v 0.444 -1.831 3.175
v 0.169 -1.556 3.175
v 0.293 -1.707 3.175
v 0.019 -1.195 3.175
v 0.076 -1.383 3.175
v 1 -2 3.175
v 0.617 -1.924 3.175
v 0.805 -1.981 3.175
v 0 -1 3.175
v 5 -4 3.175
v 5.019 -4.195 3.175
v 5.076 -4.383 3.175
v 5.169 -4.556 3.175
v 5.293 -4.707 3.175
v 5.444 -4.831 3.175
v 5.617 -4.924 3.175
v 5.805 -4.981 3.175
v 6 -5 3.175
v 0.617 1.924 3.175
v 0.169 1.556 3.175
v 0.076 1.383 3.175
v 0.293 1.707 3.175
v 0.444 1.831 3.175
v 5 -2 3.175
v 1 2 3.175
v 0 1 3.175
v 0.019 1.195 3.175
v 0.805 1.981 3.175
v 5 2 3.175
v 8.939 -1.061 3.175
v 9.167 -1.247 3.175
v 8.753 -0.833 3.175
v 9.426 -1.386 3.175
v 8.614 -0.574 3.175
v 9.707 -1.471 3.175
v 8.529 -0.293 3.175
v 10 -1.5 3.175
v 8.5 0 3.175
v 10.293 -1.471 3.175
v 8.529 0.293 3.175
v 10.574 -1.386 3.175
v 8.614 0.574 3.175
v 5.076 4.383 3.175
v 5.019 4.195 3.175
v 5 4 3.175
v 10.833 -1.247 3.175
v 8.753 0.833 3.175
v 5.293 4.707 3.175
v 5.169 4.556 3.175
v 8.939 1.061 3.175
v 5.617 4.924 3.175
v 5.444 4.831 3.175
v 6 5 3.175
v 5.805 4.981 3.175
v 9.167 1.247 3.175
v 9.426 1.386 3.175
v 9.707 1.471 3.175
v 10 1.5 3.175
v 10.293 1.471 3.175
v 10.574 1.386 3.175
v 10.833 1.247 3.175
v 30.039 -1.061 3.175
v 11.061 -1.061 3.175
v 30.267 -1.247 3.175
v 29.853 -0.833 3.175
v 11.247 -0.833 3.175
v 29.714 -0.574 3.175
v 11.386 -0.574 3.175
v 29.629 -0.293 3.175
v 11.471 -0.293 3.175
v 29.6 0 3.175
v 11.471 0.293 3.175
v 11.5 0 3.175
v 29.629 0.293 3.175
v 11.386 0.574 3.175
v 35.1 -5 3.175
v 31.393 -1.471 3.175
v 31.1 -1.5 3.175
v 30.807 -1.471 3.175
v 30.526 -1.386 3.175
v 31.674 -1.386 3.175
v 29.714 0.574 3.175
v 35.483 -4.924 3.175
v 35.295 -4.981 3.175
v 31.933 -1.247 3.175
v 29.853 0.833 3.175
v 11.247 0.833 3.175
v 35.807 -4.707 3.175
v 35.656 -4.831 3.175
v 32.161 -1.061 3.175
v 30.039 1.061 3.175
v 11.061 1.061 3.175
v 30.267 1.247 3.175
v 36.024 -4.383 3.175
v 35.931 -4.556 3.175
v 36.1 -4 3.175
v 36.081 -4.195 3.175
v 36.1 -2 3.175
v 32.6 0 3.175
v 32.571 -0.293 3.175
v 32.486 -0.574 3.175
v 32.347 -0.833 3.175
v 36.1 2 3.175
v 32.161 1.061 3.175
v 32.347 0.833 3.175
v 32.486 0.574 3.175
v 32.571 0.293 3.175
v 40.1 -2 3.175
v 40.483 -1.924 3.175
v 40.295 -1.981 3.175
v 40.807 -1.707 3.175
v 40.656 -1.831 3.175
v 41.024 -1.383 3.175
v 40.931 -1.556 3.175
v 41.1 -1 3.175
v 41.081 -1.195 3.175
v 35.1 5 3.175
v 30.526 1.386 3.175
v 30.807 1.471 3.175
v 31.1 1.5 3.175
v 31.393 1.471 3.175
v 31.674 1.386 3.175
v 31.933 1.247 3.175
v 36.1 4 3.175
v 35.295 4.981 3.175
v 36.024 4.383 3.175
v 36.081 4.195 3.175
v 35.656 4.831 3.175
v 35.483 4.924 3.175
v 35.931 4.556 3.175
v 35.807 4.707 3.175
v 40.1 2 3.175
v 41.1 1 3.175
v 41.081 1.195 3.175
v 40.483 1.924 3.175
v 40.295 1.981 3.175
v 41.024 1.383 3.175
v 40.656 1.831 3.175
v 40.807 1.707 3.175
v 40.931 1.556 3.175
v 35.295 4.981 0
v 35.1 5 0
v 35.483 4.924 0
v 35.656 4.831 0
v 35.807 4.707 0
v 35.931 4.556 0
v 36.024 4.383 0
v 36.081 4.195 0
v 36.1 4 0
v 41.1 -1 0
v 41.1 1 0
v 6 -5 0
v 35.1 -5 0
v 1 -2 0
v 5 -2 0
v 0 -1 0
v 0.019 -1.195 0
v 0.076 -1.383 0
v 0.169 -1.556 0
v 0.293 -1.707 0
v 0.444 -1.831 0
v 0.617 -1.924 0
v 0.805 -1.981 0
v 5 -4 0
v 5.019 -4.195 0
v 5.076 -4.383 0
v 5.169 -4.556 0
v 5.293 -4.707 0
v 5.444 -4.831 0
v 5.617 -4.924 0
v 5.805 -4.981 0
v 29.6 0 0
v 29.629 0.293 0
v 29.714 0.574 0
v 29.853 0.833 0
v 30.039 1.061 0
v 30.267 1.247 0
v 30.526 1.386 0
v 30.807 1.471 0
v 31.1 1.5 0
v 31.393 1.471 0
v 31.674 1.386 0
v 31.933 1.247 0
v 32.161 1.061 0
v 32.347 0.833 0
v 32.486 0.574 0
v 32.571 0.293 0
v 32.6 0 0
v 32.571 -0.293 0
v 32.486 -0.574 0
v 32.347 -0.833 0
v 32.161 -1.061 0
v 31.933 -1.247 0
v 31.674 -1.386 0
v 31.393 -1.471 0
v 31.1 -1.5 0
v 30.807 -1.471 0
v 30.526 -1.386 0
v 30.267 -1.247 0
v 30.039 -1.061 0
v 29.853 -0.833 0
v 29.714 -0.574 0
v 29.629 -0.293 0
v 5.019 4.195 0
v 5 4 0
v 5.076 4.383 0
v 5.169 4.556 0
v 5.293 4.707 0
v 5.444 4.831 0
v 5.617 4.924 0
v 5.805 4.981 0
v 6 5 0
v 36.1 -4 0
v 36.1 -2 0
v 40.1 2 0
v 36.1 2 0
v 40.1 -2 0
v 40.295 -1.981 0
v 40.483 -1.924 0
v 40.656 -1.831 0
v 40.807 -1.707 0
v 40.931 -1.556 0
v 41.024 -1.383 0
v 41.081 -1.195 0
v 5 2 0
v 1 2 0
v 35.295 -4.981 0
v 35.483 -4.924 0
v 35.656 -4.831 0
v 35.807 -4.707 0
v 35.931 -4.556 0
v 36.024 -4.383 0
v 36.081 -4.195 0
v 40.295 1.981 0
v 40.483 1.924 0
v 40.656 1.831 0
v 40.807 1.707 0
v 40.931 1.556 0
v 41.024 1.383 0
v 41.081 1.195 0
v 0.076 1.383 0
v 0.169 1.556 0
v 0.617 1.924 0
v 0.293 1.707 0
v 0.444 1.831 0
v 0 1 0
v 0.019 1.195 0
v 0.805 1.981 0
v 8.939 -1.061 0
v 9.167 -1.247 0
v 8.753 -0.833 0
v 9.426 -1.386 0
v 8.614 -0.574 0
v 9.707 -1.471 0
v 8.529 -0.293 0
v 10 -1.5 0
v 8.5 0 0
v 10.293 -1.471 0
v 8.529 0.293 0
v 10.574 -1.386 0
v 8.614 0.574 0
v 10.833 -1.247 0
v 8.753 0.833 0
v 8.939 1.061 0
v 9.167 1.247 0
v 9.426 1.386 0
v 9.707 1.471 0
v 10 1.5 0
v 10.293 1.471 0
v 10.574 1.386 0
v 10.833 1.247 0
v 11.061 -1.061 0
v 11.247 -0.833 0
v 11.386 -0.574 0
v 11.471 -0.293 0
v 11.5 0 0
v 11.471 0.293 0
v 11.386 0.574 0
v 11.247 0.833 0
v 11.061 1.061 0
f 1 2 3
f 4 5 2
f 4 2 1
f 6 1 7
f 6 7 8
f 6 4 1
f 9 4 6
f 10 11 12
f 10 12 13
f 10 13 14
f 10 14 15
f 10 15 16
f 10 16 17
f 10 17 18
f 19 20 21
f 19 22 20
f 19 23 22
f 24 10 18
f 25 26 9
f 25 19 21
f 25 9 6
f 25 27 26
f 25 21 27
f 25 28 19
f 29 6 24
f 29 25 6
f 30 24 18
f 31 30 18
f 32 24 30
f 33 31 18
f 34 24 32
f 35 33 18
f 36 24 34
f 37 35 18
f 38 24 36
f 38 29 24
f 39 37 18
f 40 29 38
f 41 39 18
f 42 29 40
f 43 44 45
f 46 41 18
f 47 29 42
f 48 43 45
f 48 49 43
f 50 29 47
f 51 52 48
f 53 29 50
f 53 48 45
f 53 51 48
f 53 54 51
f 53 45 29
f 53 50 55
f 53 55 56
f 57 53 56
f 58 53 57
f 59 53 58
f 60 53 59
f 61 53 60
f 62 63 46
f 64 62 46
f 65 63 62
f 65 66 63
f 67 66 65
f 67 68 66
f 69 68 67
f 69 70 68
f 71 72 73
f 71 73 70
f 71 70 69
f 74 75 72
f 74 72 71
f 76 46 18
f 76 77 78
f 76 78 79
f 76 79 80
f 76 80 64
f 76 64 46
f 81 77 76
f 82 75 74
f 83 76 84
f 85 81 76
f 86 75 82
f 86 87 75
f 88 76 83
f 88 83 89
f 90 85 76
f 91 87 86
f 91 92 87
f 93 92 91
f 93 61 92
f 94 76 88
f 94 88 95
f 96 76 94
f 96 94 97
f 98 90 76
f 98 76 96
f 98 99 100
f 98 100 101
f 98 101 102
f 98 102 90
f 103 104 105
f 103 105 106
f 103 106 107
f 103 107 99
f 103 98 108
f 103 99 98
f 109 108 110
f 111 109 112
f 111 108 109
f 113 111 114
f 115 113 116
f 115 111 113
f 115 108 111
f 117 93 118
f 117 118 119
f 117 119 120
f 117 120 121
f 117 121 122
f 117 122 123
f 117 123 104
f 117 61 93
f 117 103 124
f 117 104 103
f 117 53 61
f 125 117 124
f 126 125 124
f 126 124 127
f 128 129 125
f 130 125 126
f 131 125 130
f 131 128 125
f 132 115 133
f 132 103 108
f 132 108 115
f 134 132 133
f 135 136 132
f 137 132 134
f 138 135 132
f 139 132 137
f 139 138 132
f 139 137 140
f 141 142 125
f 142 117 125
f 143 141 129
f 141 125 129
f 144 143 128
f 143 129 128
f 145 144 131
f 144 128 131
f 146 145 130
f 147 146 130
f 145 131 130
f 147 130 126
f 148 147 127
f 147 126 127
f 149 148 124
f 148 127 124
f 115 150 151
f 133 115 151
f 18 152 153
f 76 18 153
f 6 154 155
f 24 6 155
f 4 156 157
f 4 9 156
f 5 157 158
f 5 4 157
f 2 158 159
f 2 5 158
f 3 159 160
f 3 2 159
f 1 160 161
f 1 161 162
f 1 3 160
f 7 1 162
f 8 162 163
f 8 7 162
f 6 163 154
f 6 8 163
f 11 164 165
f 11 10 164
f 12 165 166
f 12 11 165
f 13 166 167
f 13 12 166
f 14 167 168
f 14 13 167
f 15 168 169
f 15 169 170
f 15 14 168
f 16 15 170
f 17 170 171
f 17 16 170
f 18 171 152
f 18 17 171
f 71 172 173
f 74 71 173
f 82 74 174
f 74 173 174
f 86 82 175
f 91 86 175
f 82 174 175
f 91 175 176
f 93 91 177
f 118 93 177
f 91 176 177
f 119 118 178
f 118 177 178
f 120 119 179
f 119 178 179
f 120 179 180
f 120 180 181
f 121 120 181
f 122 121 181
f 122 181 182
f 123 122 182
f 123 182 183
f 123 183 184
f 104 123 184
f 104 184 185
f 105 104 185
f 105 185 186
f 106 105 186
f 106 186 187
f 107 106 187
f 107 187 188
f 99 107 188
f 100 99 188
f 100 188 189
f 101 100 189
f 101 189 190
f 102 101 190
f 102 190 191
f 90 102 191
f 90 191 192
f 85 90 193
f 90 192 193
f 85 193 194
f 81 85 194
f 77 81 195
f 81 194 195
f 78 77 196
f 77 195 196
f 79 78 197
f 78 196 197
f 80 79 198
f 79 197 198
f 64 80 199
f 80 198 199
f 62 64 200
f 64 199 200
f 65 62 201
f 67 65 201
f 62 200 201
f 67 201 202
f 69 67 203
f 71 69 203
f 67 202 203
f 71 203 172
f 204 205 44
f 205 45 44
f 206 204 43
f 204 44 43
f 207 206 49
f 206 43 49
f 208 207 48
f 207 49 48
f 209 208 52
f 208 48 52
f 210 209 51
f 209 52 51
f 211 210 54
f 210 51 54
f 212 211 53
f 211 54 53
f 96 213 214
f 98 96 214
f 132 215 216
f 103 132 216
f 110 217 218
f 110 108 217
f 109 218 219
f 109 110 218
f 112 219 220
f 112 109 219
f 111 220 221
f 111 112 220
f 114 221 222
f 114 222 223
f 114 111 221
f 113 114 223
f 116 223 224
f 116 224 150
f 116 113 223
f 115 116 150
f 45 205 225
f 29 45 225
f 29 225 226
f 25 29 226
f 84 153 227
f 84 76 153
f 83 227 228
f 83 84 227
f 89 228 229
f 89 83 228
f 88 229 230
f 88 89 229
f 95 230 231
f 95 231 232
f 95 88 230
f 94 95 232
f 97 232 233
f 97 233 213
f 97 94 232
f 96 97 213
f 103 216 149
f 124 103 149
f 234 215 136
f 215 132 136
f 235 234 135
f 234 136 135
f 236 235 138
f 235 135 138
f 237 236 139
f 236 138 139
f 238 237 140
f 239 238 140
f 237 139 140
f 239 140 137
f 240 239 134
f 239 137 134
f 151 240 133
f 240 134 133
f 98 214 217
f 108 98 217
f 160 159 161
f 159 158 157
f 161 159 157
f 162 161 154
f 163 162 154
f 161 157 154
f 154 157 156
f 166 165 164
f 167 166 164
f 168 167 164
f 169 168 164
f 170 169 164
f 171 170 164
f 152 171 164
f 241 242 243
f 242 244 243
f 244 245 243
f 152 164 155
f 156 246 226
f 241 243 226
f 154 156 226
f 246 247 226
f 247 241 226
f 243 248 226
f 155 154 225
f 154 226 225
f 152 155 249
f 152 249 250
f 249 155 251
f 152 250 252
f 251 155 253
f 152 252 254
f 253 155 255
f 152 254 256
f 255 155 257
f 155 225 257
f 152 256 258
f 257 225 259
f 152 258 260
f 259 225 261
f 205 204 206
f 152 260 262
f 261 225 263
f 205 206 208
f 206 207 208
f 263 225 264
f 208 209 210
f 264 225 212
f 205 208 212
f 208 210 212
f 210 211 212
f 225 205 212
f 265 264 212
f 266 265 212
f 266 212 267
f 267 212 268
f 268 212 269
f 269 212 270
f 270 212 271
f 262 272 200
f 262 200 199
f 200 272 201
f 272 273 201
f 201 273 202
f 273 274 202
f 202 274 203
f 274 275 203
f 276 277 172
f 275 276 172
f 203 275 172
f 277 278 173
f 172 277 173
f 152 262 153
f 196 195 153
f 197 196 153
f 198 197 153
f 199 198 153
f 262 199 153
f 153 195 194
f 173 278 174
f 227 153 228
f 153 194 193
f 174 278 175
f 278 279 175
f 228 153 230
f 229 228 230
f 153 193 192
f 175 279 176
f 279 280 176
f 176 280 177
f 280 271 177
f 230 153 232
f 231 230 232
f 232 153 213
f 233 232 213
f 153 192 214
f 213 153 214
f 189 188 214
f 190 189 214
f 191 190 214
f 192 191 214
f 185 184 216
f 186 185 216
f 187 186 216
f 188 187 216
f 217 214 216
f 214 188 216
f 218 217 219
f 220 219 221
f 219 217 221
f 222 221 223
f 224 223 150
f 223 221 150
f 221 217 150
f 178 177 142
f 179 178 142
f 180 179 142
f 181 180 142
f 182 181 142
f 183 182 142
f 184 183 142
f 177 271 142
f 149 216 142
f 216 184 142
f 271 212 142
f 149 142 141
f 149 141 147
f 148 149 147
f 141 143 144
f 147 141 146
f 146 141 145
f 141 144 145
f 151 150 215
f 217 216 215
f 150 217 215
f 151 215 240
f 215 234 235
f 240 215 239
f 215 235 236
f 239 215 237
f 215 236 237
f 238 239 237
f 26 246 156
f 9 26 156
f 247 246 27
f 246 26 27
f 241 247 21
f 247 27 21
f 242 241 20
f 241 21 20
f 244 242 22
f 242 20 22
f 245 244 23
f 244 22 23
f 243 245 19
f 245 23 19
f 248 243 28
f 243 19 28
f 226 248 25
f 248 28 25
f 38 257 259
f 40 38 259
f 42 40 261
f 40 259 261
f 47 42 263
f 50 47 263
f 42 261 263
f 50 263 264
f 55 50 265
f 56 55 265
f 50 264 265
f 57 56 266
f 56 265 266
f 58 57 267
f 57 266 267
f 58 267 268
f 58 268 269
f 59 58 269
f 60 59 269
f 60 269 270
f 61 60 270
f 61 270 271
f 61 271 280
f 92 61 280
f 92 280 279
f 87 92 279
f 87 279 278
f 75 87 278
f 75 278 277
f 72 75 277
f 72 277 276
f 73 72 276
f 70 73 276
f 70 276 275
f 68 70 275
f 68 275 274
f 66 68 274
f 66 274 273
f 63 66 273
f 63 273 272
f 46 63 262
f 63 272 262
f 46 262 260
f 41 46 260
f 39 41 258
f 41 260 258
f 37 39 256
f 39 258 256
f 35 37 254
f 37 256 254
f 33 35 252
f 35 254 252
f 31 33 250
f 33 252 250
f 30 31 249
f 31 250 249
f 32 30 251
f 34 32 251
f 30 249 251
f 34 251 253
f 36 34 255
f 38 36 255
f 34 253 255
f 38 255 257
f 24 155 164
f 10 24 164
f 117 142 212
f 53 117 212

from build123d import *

# Parameters (mm, degrees)
BOSS_EXTRUDE1_DEPTH   = 3.175
F_3_0MM_DOWEL_HOLE1_D = 3
FILLET1_R             = 1


with BuildPart() as part:
    # Sketch1 → Boss-Extrude1 (new body)
    with BuildSketch(Plane.XY):
        Polygon((0, 2), (0, -2), (5, -2), (5, -5), (36.1, -5), (36.1, -2), (41.1, -2), (41.1, 2), (36.1, 2), (36.1, 5), (5, 5), (5, 2), align=None)
    extrude(amount=BOSS_EXTRUDE1_DEPTH)

    # Ø3.0mm Dowel Hole1 (through all)
    with Locations(Plane.XY.offset(3.175)):
        with Locations((10, 0), (31.1, 0)):
            Hole(F_3_0MM_DOWEL_HOLE1_D / 2)

    # Fillet1
    fillet1_edges = [part.edges().sort_by_distance(p)[0] for p in [
        (0, -2, 1.5875),
        (0, 2, 1.5875),
        (5, 5, 1.5875),
        (36.1, 5, 1.5875),
        (41.1, 2, 1.5875),
        (41.1, -2, 1.5875),
        (36.1, -5, 1.5875),
        (5, -5, 1.5875),
    ]]
    fillet(fillet1_edges, radius=FILLET1_R)


solid = part.part
